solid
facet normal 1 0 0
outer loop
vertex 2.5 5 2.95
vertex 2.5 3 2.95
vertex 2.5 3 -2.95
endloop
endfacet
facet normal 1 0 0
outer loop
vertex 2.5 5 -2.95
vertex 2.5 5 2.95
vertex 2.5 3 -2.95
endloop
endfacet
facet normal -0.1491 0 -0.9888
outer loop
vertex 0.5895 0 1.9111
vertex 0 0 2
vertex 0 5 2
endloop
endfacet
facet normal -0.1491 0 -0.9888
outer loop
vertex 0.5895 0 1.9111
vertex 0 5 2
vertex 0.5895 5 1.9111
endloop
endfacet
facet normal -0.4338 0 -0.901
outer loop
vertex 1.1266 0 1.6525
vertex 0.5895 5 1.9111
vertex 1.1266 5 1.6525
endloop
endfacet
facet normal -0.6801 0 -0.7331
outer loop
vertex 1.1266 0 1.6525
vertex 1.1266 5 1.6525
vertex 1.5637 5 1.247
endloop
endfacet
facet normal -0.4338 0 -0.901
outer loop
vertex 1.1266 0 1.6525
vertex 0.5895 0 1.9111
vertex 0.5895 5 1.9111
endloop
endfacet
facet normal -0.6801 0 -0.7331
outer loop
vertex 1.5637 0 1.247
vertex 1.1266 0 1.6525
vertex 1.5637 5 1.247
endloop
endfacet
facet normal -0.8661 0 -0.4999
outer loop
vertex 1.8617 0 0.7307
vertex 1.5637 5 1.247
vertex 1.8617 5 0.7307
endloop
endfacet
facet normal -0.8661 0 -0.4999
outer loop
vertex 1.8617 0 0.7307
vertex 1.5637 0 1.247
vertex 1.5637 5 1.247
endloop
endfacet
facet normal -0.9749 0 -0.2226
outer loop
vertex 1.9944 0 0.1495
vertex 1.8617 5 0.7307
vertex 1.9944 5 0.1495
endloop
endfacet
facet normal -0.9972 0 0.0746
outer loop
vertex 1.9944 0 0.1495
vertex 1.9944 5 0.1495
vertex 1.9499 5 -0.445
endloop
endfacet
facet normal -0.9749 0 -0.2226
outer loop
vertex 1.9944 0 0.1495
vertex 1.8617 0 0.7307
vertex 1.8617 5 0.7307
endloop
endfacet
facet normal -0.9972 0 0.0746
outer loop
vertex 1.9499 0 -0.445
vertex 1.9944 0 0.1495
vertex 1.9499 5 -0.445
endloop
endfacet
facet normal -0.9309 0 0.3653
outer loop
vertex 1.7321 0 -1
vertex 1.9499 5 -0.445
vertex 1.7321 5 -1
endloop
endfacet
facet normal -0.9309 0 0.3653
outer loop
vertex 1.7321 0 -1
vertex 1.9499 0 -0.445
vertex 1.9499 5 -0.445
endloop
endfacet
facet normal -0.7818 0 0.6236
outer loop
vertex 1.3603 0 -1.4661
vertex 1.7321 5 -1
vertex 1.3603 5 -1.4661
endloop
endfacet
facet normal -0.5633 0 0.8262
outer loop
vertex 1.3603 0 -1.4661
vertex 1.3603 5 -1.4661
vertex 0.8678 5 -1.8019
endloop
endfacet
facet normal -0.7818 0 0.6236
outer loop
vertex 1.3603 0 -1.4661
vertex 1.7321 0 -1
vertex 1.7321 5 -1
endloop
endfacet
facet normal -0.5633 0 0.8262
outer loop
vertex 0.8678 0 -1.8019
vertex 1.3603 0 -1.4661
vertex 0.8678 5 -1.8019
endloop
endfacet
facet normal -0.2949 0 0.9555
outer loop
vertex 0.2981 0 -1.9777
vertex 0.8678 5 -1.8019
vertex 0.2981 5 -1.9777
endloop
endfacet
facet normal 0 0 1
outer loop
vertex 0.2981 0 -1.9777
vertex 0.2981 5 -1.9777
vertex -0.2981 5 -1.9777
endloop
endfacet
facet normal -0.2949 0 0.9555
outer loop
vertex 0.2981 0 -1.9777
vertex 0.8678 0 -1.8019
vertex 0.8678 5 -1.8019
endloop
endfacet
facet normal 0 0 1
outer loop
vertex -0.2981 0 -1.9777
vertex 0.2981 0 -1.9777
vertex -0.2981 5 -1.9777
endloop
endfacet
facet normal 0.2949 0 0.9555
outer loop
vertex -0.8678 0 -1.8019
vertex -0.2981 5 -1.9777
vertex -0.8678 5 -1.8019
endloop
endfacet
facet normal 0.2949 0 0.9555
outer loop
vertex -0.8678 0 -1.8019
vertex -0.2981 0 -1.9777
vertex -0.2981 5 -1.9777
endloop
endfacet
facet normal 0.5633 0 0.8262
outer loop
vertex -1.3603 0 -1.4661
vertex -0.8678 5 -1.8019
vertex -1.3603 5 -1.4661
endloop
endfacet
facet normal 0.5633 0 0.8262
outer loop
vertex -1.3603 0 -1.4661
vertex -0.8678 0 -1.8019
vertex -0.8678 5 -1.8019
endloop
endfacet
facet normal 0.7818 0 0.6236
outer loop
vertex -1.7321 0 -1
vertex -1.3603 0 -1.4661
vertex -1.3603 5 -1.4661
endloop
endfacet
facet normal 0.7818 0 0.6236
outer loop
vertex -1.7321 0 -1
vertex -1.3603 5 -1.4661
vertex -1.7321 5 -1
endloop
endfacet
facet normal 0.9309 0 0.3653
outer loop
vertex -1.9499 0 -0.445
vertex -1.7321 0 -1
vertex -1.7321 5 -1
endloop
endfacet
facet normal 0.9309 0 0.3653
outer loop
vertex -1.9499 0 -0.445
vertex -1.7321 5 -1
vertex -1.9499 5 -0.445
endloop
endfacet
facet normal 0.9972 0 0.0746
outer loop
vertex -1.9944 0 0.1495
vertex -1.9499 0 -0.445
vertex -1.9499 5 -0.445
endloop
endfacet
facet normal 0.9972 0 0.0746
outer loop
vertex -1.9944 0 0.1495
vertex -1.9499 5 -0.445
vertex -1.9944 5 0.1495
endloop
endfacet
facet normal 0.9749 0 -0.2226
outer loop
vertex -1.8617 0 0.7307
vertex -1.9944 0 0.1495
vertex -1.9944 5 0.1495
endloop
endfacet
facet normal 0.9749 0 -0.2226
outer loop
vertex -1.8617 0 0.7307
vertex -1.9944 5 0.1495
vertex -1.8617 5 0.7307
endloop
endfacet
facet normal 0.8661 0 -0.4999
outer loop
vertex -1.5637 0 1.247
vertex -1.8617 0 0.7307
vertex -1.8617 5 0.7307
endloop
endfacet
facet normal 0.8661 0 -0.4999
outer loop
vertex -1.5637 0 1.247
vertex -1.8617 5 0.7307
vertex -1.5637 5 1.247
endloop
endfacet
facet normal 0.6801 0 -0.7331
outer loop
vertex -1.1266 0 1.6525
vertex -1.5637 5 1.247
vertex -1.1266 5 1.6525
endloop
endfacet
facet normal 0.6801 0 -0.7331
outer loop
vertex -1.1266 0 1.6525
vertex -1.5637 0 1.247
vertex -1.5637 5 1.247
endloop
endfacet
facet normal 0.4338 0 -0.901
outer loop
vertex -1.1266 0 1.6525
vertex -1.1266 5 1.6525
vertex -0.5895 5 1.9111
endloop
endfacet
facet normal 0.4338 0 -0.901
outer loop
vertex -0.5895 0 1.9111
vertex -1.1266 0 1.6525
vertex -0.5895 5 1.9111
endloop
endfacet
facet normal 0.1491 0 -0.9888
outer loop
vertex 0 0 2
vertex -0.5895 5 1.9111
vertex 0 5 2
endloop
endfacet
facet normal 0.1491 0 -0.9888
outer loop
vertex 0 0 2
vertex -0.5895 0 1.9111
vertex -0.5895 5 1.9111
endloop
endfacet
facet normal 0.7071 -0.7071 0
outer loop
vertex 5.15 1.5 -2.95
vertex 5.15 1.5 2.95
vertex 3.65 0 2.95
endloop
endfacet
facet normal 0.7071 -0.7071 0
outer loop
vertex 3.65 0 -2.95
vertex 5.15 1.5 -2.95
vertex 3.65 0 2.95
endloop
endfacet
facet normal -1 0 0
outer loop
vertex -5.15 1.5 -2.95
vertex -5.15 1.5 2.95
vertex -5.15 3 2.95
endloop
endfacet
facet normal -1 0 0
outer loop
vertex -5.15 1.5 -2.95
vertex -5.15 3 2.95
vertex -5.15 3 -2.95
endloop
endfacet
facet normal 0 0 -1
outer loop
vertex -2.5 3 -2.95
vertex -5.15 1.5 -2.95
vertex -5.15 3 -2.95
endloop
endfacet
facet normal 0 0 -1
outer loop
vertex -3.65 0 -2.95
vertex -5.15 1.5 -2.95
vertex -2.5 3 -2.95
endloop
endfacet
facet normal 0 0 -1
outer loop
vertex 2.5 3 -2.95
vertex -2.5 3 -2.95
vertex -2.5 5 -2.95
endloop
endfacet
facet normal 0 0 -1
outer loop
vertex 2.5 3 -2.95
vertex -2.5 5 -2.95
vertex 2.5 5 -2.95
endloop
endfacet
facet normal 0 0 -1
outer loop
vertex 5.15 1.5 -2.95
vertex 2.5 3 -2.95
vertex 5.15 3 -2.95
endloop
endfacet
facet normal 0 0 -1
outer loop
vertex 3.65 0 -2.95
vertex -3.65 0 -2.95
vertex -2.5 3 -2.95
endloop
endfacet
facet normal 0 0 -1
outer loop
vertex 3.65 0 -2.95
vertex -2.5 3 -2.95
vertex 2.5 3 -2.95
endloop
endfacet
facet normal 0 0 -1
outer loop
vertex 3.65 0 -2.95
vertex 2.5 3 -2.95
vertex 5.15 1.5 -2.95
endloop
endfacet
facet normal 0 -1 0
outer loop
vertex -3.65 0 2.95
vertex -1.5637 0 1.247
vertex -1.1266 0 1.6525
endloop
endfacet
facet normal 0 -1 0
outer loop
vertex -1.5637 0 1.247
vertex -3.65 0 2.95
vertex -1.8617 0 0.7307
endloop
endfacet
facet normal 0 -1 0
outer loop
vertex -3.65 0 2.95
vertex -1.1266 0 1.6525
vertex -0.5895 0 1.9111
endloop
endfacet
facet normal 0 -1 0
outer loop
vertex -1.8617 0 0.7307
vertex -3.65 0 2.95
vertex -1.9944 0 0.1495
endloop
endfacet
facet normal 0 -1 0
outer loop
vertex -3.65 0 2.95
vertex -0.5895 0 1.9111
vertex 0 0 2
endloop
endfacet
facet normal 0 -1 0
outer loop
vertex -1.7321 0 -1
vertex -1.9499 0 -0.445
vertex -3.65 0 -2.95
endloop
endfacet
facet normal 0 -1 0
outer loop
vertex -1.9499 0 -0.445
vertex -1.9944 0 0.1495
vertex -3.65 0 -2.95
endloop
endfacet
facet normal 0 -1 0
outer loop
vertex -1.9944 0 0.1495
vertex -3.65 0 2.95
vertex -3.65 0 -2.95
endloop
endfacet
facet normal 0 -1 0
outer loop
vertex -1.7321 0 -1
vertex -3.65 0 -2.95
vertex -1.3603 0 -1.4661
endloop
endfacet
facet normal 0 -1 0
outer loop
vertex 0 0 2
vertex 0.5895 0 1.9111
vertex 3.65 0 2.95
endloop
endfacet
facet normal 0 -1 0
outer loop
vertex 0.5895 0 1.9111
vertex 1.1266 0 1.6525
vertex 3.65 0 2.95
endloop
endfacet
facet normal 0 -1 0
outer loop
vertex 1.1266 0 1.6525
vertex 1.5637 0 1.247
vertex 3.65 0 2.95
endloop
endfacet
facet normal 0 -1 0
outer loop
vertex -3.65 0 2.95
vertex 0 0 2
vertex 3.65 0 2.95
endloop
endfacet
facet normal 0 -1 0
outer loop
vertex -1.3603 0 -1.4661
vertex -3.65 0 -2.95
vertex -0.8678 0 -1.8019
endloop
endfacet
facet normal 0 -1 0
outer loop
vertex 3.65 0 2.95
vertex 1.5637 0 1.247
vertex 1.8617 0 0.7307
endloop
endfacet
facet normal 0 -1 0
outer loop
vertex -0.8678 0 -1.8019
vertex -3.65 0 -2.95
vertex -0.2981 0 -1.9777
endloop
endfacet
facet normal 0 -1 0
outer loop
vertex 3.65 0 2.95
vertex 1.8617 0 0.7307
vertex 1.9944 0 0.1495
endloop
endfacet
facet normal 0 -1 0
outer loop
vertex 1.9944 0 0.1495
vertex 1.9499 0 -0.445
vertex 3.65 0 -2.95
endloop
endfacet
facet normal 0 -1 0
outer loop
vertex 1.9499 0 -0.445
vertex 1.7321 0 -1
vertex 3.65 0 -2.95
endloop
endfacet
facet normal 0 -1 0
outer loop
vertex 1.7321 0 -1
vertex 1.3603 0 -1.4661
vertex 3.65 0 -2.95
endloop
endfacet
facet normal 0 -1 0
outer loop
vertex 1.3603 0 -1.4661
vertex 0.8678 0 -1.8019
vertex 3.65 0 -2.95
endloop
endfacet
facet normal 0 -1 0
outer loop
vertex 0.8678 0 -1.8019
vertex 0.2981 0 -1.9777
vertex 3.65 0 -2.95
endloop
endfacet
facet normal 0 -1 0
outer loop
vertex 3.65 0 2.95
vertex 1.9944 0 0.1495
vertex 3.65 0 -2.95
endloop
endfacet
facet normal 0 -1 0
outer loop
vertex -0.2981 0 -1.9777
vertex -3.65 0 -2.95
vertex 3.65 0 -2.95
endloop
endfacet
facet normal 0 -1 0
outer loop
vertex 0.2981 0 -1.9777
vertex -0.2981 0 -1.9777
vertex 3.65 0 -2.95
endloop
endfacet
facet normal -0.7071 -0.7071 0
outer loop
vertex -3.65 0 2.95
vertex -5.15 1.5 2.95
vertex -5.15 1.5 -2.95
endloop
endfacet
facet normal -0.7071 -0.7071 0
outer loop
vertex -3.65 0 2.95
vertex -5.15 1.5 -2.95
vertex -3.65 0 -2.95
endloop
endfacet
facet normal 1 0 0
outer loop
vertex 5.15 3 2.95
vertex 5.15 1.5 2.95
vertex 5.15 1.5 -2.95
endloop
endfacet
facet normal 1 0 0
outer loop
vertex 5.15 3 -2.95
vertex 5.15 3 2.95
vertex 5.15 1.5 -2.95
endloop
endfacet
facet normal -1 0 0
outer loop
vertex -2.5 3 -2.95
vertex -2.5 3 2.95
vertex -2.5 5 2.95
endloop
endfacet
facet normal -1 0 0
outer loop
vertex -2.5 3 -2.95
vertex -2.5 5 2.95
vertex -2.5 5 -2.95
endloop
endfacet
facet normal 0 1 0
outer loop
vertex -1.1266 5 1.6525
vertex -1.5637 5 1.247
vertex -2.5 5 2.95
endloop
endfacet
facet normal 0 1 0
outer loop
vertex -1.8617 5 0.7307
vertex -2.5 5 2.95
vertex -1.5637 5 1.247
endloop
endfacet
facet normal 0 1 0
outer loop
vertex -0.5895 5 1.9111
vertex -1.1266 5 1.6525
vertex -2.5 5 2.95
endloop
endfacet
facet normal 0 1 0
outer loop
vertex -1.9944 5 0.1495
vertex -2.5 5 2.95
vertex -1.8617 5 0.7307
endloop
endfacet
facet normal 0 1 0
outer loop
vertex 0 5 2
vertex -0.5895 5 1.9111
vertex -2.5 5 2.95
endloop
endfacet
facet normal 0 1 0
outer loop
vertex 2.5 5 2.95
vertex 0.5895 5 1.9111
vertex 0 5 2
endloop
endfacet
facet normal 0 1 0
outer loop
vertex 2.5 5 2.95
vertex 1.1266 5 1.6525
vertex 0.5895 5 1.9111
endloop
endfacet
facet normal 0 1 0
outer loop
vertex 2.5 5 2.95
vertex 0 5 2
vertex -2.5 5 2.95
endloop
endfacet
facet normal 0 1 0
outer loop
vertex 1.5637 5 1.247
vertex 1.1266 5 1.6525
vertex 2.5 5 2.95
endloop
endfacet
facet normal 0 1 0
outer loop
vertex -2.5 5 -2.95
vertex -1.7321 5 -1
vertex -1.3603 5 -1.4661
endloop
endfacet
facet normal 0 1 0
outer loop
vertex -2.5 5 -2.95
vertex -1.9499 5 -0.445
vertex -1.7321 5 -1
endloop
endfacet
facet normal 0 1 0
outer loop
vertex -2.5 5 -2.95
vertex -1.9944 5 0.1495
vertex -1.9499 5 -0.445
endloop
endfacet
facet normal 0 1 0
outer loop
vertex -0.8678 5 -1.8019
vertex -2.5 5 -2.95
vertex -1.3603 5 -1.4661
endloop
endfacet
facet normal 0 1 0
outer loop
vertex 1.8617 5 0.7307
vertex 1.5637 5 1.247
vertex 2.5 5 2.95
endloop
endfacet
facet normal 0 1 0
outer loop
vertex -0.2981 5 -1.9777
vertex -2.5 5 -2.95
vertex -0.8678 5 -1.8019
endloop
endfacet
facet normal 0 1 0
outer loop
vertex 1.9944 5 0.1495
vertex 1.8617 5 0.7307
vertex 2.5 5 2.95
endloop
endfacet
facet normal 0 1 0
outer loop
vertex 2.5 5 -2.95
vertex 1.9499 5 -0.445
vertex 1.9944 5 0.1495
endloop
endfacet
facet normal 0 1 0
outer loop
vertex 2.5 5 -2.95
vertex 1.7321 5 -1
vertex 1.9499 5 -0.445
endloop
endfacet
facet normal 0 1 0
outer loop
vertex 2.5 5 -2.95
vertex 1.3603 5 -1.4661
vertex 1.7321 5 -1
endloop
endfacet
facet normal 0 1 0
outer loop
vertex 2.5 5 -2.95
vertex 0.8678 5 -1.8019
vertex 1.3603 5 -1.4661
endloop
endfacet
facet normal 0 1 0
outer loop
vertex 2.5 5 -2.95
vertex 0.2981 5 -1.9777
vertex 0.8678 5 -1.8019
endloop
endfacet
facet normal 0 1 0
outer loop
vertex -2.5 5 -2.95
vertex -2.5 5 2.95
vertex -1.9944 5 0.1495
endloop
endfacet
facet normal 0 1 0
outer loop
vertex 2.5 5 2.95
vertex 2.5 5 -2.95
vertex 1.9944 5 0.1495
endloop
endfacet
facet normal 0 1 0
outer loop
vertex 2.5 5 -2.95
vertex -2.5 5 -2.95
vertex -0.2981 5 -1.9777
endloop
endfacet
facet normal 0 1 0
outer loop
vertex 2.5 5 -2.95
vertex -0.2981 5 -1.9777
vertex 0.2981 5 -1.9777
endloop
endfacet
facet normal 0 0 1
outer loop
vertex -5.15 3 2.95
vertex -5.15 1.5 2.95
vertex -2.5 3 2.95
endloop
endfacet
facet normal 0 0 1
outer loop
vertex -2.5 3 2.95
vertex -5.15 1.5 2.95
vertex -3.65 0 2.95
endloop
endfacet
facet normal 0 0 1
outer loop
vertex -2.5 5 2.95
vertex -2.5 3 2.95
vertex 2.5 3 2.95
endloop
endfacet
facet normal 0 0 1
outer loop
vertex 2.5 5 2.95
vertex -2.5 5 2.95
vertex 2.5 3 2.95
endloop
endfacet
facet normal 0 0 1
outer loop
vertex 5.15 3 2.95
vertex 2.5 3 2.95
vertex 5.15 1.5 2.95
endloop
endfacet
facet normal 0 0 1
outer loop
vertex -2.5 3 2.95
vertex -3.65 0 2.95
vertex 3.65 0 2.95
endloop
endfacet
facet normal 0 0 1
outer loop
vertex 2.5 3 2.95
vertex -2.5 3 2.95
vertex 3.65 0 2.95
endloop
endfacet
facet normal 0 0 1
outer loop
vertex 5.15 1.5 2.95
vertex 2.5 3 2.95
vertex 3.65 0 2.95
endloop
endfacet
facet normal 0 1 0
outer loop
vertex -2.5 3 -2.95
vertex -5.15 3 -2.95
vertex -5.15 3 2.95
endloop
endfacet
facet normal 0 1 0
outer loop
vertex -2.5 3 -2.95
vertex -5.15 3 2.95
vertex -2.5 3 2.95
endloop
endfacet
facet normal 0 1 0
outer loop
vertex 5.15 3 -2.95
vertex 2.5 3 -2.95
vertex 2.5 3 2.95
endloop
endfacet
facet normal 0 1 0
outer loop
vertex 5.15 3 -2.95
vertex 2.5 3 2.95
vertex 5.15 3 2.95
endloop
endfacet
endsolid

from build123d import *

# Parameters (mm, degrees)
SKETCH_1_W          = 2.65
SKETCH_1_H          = 5.9
EXTRUDE_3_DEPTH     = 3
EXTRUDE_3_2_DEPTH   = 3
SKETCH_1_3_W        = 5
SKETCH_1_3_H        = 5.9
SKETCH_1_3_R        = 2
EXTRUDE_4_DEPTH     = 5
CUT_EXTRUDE_1_DEPTH = 10.2915284


with BuildPart() as part:
    # 草图1 → 凸台-拉伸3 (new body)
    with BuildSketch(Plane(origin=(0, 0, 0), x_dir=(1, 0, 0), z_dir=(0, 1, 0))):
        with Locations((3.825, 0)):
            Rectangle(SKETCH_1_W, SKETCH_1_H)
    extrude(amount=EXTRUDE_3_DEPTH)



with BuildPart() as body_2:
    # 草图1 → Extrude 3 2 (new body)
    with BuildSketch(Plane(origin=(0, 0, 0), x_dir=(1, 0, 0), z_dir=(0, 1, 0))):
        with Locations((-3.825, 0)):
            Rectangle(SKETCH_1_W, SKETCH_1_H)
    extrude(amount=EXTRUDE_3_2_DEPTH)


with BuildPart() as part_1:
    add(part.part)

    add(body_2.part)  # 凸台-拉伸4 merges body 2
    # 草图1<3> → 凸台-拉伸4 (add)
    with BuildSketch(Plane(origin=(0, 0, 0), x_dir=(1, 0, 0), z_dir=(0, 1, 0))):
        Rectangle(SKETCH_1_3_W, SKETCH_1_3_H)
        Circle(SKETCH_1_3_R, mode=Mode.SUBTRACT)
    extrude(amount=EXTRUDE_4_DEPTH)

    # 草图2 → 切除-拉伸1 (cut, through all)
    with BuildSketch(Plane.XY.offset(2.95)):
        Polygon((-5.15, 1.5), (-3.65, 0), (-5.15, 0), align=None)
        Polygon((5.15, 1.5), (3.65, 0), (5.15, 0), align=None)
    extrude(amount=-CUT_EXTRUDE_1_DEPTH, mode=Mode.SUBTRACT)


solid = part_1.part
